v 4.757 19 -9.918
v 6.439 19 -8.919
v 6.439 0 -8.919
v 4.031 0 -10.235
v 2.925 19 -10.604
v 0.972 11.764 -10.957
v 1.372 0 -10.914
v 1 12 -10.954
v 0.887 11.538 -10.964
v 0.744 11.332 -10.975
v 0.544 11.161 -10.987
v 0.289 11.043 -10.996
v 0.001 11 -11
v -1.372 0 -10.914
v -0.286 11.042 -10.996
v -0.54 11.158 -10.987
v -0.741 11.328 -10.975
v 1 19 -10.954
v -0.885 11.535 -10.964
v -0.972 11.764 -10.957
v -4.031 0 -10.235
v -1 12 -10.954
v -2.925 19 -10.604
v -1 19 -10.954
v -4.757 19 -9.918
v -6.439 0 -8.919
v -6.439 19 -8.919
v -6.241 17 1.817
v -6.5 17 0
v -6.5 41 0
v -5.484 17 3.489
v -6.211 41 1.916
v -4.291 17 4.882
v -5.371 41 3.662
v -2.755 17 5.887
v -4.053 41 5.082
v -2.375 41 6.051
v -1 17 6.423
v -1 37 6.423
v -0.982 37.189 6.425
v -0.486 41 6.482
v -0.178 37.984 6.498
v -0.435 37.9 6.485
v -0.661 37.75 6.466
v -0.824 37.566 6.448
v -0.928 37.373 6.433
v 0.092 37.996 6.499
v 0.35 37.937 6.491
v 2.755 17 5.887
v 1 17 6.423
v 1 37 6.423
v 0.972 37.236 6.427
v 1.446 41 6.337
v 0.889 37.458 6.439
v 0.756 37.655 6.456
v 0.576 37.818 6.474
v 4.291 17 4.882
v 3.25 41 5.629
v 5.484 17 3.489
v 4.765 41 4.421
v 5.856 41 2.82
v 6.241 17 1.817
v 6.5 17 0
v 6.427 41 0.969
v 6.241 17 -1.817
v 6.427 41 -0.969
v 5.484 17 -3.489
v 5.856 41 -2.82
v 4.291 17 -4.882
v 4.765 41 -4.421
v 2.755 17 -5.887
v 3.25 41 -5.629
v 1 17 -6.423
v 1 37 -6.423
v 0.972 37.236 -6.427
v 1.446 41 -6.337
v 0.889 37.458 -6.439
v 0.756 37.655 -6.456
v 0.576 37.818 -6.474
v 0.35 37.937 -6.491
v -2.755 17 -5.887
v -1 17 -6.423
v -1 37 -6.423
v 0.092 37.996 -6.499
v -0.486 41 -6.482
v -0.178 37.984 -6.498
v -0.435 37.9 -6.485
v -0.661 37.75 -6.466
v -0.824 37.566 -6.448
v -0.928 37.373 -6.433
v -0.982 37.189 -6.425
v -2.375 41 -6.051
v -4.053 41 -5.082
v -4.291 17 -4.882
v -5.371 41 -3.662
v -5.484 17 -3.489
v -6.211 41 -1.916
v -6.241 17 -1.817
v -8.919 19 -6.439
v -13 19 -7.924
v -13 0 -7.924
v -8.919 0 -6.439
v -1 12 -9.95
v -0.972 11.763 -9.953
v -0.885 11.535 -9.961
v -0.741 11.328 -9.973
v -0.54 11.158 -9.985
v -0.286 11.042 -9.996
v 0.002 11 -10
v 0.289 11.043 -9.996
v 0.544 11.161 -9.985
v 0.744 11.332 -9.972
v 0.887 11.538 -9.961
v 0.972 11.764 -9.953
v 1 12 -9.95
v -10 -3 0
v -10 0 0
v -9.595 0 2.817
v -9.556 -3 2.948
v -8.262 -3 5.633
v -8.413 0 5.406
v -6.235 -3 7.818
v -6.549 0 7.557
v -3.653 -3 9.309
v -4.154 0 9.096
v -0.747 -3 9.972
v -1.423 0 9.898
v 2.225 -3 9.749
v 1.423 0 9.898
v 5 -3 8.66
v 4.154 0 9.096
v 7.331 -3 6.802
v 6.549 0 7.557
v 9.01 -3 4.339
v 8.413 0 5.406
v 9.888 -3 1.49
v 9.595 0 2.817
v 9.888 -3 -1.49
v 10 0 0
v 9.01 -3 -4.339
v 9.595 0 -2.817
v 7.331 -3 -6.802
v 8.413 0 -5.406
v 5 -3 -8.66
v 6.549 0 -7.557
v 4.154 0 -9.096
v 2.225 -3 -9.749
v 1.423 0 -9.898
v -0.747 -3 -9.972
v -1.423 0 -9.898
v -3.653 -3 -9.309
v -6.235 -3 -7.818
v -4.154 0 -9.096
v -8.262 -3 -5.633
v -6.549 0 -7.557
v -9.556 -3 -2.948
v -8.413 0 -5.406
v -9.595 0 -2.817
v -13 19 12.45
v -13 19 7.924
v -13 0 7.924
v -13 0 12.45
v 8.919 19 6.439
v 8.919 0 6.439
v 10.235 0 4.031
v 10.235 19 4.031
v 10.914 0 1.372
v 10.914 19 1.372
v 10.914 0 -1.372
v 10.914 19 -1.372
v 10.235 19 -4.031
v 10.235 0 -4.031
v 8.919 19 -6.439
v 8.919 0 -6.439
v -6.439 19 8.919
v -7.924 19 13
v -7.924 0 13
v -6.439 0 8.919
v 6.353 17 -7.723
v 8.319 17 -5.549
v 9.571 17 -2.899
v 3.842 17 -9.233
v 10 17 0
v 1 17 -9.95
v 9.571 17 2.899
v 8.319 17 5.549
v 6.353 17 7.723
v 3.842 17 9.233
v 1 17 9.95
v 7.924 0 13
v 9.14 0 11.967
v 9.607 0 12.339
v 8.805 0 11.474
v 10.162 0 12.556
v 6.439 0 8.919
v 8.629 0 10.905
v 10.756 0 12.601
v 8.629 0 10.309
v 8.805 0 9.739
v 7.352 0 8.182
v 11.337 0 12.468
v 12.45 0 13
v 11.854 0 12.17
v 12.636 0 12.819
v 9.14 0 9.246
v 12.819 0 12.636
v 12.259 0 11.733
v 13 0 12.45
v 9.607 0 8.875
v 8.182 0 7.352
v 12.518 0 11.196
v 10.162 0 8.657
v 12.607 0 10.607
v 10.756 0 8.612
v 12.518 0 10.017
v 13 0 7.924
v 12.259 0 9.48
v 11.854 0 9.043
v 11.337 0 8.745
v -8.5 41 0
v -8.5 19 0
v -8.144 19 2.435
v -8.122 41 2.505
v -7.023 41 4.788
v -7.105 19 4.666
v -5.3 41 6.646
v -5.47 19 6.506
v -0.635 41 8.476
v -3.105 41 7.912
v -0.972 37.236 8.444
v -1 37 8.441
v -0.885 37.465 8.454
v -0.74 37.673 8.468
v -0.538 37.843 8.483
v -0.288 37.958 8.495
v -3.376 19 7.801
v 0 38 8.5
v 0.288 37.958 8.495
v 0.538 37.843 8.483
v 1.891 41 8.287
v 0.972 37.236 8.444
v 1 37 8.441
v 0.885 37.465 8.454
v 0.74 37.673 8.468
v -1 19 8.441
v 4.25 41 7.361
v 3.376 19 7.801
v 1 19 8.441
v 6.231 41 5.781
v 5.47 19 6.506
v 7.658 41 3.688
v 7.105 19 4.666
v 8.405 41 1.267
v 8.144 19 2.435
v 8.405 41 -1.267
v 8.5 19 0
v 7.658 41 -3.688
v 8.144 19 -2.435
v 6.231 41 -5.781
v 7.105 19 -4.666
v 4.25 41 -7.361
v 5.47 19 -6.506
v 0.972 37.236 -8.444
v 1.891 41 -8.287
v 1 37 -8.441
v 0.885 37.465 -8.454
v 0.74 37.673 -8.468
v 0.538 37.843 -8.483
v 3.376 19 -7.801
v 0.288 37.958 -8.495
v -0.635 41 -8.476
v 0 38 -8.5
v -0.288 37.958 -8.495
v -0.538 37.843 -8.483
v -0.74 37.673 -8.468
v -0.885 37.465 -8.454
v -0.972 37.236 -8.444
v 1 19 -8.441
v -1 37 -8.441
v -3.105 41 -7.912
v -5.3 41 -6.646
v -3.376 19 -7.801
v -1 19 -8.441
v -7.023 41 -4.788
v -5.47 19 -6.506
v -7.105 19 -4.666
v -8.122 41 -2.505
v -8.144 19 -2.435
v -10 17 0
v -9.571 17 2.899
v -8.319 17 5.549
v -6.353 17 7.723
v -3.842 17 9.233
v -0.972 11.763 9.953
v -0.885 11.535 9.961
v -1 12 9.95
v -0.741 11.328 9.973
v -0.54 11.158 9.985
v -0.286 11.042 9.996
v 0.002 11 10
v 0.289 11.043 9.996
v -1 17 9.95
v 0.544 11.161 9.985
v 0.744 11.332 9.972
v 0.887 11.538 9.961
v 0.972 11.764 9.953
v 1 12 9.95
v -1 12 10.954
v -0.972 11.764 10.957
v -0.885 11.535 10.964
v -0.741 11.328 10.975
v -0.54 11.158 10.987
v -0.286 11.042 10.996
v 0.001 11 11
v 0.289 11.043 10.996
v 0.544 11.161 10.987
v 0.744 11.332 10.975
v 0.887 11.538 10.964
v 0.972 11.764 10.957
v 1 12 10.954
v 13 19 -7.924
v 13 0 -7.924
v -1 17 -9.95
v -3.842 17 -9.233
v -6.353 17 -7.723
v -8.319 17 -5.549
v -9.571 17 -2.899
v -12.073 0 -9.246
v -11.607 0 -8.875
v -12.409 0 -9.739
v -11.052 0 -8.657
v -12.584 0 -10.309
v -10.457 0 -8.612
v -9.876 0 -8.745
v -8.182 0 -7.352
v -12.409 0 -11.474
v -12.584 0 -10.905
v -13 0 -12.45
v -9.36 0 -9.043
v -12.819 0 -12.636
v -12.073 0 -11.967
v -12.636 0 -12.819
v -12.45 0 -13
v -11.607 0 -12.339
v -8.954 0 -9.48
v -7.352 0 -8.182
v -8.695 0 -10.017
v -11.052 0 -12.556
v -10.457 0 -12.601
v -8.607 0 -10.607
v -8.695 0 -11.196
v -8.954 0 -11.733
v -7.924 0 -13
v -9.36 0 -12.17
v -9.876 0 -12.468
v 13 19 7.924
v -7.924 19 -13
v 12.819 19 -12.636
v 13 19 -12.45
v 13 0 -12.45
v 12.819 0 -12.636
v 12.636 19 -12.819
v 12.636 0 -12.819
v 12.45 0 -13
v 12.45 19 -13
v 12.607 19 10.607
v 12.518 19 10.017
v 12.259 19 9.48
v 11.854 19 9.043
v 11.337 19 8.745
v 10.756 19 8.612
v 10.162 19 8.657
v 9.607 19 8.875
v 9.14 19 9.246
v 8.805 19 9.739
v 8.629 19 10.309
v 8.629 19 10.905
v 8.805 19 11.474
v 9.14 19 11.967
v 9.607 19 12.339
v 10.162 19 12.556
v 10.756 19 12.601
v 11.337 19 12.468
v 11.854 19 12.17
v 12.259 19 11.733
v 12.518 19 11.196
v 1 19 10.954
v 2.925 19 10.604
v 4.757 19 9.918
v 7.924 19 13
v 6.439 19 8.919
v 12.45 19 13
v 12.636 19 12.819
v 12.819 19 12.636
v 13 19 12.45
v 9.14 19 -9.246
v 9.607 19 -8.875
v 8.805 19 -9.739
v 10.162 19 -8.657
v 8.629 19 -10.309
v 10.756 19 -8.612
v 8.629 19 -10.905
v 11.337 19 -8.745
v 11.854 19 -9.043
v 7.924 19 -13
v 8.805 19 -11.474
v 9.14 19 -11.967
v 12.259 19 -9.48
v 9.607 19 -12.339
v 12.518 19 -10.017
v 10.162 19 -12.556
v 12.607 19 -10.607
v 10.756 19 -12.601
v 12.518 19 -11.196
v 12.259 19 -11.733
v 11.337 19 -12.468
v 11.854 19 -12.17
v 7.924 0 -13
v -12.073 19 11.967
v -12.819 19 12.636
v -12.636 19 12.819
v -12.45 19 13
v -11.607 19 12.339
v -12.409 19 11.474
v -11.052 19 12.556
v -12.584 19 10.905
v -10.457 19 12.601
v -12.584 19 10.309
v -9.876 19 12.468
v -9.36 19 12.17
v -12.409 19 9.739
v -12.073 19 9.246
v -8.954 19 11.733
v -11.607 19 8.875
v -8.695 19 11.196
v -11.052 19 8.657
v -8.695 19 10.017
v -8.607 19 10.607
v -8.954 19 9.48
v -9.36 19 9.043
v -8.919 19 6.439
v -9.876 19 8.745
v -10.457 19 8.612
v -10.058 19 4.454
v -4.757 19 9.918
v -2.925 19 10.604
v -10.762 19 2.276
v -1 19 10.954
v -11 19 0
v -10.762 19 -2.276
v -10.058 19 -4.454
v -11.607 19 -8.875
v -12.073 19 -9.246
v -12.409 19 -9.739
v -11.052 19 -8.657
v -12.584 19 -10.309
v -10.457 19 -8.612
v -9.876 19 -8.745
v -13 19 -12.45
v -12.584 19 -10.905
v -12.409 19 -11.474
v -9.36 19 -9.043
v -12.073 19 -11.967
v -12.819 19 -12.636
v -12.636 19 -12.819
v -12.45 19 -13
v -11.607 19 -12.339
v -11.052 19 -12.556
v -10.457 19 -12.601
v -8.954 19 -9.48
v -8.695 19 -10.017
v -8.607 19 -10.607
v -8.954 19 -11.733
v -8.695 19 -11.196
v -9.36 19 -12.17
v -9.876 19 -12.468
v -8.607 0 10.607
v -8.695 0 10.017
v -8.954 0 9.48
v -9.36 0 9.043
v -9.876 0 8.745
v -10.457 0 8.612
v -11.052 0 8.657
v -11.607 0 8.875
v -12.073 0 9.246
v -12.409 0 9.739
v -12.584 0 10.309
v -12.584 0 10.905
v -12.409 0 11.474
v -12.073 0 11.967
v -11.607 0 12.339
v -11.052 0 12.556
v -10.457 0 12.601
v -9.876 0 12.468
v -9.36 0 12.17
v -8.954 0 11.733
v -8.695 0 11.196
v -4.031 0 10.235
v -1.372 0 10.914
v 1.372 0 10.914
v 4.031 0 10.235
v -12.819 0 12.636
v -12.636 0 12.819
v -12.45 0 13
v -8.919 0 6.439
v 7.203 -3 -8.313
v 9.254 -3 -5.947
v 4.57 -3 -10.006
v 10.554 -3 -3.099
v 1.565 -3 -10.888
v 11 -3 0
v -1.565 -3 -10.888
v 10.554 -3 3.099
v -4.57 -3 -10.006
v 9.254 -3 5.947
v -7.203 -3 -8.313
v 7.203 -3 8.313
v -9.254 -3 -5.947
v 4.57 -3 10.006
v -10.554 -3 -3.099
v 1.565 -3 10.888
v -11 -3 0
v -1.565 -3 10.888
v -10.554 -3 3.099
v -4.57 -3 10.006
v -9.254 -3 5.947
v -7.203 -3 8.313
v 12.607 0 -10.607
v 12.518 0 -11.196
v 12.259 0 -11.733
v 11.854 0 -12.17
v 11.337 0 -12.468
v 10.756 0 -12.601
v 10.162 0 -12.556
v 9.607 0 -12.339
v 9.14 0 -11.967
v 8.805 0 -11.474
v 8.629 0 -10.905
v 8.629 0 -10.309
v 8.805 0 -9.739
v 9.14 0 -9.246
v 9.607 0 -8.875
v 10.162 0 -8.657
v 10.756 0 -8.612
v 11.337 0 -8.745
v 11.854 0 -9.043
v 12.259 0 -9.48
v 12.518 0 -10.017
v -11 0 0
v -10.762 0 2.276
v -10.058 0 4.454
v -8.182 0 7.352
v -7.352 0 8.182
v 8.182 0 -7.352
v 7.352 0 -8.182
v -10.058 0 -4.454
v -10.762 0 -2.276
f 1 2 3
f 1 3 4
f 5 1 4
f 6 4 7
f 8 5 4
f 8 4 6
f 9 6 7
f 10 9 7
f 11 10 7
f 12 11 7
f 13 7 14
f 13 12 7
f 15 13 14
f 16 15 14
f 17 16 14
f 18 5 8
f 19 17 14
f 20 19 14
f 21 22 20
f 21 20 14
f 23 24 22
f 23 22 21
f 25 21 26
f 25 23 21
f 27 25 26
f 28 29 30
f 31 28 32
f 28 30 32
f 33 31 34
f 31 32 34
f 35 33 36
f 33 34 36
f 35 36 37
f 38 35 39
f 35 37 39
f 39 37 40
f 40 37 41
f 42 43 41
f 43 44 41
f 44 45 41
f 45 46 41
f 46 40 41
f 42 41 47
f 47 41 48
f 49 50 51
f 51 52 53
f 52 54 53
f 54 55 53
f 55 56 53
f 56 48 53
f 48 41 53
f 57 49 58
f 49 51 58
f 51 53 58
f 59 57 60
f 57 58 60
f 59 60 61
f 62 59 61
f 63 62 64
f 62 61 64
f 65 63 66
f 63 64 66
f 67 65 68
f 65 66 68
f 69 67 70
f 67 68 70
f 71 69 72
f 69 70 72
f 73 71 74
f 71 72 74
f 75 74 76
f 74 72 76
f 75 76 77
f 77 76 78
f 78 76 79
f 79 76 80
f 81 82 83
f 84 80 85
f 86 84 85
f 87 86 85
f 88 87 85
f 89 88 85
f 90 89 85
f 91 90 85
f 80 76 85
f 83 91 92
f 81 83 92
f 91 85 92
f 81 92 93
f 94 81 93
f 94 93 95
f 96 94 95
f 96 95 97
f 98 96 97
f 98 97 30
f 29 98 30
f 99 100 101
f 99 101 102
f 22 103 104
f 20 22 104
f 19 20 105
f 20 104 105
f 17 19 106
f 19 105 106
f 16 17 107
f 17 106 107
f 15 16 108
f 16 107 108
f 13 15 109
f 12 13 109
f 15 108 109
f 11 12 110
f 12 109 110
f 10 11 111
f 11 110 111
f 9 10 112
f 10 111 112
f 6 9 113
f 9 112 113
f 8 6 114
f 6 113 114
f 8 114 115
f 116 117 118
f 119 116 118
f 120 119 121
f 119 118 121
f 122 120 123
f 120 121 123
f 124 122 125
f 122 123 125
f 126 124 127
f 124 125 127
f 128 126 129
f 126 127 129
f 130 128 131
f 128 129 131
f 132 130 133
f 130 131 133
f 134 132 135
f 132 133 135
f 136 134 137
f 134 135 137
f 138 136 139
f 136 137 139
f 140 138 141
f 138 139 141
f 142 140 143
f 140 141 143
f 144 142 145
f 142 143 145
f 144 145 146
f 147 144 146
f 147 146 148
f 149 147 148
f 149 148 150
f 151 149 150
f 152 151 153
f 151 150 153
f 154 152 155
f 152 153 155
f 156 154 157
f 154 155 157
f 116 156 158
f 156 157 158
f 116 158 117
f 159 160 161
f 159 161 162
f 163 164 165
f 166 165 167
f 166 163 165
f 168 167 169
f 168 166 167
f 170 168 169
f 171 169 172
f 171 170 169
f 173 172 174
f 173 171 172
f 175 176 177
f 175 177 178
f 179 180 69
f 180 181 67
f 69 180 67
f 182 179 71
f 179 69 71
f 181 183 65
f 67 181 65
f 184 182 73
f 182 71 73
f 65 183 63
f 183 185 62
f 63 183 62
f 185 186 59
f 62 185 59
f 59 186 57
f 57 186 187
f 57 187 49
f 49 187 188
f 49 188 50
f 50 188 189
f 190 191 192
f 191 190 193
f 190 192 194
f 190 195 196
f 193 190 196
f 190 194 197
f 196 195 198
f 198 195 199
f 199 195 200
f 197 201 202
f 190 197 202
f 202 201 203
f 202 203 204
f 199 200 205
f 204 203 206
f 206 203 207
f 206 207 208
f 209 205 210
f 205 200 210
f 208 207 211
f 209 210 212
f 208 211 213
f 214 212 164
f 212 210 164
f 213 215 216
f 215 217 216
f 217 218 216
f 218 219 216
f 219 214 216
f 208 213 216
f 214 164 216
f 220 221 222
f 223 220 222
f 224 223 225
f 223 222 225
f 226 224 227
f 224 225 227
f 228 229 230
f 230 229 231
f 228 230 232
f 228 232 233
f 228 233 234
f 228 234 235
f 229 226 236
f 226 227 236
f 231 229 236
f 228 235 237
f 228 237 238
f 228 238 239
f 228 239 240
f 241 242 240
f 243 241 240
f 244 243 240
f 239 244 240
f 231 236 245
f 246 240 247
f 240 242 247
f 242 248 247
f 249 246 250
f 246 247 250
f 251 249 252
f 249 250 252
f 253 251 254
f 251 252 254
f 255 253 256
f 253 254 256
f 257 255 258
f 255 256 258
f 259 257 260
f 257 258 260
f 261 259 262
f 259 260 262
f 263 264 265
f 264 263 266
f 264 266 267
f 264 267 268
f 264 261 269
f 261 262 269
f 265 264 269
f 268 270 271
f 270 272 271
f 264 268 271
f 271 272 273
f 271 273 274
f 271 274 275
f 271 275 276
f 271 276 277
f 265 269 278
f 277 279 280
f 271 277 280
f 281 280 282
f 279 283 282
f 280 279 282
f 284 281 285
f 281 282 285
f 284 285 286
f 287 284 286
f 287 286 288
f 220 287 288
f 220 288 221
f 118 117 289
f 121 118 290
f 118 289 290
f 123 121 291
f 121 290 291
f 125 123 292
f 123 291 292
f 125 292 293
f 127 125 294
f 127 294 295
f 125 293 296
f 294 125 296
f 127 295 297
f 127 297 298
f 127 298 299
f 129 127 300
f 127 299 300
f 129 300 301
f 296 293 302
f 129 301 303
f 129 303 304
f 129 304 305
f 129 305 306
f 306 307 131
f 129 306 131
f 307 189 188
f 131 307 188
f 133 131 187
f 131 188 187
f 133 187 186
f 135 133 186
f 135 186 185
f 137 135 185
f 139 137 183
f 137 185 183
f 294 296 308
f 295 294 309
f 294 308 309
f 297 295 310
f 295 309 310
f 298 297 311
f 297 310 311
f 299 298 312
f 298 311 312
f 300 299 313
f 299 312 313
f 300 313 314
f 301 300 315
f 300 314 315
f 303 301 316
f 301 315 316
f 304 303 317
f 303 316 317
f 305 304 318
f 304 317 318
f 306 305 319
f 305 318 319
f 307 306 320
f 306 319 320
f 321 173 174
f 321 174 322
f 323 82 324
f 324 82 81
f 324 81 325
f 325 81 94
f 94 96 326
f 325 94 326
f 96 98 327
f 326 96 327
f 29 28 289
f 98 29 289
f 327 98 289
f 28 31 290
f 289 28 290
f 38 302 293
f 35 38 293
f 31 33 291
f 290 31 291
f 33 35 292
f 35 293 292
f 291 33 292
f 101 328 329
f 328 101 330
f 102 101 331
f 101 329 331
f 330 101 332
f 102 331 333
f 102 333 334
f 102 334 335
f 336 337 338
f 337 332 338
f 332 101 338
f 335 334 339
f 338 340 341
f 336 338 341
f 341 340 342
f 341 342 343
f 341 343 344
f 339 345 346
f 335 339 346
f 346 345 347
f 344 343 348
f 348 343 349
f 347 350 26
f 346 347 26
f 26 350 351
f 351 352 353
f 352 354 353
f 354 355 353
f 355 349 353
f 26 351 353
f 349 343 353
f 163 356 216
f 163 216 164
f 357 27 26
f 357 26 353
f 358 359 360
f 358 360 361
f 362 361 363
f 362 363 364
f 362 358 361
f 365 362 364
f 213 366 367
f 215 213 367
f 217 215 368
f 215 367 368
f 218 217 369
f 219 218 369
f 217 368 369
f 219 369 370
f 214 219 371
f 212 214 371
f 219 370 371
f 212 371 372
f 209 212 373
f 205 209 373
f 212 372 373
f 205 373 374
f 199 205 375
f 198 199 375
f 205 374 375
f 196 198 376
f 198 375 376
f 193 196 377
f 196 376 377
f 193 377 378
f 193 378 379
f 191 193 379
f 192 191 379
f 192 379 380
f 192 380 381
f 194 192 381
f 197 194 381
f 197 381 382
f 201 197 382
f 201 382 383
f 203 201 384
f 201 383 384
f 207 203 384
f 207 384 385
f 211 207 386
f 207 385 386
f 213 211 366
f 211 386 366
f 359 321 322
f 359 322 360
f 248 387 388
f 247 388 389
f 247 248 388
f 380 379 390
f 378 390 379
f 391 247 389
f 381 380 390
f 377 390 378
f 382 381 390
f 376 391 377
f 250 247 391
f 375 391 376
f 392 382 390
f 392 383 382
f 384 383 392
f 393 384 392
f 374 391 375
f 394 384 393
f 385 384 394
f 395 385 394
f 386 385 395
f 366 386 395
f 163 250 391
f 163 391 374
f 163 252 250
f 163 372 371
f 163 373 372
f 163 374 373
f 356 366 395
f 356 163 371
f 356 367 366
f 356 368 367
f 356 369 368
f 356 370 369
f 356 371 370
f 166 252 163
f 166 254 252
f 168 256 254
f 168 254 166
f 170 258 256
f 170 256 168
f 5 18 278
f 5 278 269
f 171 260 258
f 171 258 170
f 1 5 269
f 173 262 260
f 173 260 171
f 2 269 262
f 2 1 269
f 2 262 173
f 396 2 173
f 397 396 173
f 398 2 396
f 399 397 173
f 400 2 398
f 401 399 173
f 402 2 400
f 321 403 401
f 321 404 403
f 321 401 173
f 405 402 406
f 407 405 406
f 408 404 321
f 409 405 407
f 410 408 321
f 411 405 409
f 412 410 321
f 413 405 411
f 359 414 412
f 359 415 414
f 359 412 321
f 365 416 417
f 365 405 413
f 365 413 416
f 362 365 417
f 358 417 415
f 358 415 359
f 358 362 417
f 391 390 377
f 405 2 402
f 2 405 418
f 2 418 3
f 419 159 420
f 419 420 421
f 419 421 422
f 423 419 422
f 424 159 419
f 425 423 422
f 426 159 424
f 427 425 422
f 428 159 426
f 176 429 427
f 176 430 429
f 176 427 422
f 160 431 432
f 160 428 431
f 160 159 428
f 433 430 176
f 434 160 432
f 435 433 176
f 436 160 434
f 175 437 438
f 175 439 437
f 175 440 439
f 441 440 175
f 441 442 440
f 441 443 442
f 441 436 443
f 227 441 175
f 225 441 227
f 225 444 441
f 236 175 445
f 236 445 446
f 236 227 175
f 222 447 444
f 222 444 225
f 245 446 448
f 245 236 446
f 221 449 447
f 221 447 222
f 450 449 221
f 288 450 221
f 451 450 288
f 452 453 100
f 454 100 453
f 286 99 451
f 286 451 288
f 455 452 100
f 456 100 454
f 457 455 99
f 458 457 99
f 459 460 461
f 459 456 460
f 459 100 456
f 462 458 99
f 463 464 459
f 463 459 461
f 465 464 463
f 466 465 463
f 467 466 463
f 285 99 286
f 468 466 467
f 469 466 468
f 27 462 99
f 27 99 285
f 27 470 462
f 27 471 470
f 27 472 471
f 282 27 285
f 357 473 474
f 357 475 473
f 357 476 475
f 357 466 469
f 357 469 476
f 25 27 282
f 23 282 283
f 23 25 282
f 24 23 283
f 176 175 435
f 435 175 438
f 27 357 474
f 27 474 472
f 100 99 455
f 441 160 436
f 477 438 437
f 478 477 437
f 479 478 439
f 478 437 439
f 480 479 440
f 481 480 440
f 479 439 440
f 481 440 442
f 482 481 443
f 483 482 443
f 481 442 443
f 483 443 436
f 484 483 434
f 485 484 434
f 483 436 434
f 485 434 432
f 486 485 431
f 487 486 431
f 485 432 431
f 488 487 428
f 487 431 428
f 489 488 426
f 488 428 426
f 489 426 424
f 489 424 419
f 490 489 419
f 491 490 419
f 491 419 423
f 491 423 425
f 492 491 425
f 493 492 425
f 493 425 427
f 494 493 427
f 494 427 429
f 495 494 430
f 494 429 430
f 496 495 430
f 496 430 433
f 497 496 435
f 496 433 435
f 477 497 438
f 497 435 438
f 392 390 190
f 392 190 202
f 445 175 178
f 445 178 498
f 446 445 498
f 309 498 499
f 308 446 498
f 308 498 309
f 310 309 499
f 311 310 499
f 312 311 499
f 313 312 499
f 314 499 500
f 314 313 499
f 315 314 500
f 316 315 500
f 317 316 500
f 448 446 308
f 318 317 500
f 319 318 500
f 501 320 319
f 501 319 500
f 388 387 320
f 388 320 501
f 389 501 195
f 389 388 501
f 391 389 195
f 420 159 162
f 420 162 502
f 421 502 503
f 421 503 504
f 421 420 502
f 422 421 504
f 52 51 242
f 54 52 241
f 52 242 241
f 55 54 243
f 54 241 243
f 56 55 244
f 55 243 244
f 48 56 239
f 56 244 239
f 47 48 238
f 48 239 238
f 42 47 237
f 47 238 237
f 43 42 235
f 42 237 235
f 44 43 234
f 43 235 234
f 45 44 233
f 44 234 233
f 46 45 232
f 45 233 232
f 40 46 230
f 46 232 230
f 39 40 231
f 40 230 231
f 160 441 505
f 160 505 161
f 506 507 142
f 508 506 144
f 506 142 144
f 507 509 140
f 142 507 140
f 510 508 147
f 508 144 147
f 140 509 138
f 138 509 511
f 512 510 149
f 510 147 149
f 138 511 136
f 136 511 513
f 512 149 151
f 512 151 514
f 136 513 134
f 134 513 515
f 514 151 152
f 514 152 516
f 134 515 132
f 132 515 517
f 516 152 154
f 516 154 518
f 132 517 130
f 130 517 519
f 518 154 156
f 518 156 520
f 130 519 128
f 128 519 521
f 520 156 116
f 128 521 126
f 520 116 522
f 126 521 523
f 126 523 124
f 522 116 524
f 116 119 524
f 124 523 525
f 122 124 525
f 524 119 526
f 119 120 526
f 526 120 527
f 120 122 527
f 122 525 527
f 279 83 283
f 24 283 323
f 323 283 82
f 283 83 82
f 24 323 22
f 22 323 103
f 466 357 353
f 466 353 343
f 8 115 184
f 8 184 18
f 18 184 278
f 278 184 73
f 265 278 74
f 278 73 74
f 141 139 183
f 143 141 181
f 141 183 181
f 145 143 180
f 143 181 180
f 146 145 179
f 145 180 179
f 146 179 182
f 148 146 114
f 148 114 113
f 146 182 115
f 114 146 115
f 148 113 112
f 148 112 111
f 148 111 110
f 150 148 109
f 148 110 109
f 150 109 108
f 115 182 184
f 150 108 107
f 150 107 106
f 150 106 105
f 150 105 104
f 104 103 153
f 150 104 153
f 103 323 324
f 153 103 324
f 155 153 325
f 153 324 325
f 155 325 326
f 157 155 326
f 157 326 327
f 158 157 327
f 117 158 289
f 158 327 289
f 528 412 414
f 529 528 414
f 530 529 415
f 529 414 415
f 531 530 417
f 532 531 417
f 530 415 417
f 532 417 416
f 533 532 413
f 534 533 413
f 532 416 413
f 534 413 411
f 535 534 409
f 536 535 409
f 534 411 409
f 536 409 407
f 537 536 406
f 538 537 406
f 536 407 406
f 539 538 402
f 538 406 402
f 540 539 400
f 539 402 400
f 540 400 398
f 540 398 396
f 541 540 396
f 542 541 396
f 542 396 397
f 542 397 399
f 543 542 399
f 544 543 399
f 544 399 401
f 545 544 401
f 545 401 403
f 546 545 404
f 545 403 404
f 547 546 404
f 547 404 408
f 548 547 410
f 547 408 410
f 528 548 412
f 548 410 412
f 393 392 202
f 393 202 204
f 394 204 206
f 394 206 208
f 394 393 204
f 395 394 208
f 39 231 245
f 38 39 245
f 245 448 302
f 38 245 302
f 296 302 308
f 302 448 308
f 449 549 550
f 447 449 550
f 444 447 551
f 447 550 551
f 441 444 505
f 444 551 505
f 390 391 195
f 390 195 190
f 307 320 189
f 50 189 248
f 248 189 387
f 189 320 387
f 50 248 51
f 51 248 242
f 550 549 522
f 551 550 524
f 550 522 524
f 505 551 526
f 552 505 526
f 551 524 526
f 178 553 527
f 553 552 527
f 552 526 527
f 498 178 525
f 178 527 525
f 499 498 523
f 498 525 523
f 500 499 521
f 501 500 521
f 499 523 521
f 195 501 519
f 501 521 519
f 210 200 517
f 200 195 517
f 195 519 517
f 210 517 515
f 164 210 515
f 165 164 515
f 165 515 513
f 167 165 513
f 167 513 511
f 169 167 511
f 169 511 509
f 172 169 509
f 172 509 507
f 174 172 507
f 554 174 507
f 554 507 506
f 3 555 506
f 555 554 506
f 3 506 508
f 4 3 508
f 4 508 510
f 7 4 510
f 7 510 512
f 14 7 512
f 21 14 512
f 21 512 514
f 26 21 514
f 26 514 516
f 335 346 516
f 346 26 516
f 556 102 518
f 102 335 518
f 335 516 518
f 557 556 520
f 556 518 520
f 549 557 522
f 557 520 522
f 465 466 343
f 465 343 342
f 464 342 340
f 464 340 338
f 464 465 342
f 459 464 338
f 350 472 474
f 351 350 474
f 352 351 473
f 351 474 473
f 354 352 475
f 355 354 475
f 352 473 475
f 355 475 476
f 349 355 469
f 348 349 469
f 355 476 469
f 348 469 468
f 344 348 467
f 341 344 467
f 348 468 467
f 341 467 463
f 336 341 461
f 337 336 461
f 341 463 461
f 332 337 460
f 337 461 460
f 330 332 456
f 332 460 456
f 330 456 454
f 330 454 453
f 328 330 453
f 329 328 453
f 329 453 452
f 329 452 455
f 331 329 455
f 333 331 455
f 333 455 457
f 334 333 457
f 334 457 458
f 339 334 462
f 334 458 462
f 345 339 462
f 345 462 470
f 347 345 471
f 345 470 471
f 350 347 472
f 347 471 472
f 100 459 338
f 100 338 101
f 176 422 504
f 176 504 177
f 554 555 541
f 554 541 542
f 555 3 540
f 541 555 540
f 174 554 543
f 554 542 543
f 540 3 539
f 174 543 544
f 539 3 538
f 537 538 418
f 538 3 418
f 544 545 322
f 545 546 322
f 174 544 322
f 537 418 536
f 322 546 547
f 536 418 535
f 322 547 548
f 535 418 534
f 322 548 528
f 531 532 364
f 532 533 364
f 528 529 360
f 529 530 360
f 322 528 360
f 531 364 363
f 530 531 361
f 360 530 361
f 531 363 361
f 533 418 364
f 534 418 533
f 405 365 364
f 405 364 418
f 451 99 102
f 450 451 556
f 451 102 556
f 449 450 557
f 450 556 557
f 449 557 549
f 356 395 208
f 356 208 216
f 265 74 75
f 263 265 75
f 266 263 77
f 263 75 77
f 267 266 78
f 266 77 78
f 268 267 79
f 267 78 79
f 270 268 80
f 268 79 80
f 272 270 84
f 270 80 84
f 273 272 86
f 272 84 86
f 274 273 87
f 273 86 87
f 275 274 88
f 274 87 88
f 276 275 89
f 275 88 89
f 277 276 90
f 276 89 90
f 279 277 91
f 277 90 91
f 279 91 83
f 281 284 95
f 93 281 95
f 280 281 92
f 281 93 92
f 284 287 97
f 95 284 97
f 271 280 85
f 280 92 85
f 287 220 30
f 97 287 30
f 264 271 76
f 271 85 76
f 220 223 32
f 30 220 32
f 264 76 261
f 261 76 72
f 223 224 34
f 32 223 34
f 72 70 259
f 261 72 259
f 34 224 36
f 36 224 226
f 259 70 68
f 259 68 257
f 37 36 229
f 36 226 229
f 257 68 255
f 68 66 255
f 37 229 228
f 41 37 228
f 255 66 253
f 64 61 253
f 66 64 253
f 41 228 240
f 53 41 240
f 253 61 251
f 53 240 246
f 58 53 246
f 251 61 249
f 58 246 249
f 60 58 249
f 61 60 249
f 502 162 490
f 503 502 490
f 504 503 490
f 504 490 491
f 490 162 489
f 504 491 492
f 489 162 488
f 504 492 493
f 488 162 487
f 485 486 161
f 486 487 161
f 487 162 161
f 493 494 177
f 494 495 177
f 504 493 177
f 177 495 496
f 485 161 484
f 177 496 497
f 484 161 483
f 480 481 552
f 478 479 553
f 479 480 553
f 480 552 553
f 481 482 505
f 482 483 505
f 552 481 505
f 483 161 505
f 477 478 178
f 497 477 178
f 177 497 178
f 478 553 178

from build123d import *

# Parameters (mm, degrees)
ESQUISSE3_R      = 2
ESQUISSE3_R_2    = 10
EXTRUSION2_DEPTH = 19
EXTRUSION4_DEPTH = 27


with BuildPart() as part:
    # Esquisse1 → Révolution1 (revolve)
    with BuildSketch(Plane.XY):
        Polygon((-6.5, 17), (-6.5, 41), (-8.5, 41), (-8.5, 19), (-11, 19), (-11, -3), (-10, -3), (-10, 17), align=None)
    revolve(axis=Axis((0, 0, 0), (0, 1, 0)))

    # Esquisse3 → Extrusion2 (add)
    with BuildSketch(Plane(origin=(0, 19, 0), x_dir=(1, 0, 0), z_dir=(0, 1, 0))):
        with BuildLine():
            Line((-12.449899598, -13), (-7.924146363, -13))
            Line((-7.924146363, -13), (-6.438678833, -8.918711504))
            ThreePointArc((-6.438678833, -8.918711504), (0, -11), (6.438678833, -8.918711504))
            Line((6.438678833, -8.918711504), (7.924146363, -13))
            Line((7.924146363, -13), (12.449899598, -13))
            ThreePointArc((12.449899598, -13), (12.727922061, -12.727922061), (13, -12.449899598))
            Line((13, -12.449899598), (13, -7.924146363))
            Line((13, -7.924146363), (8.918711504, -6.438678833))
            ThreePointArc((8.918711504, -6.438678833), (11, 0), (8.918711504, 6.438678833))
            Line((8.918711504, 6.438678833), (13, 7.924146363))
            Line((13, 7.924146363), (13, 12.449899598))
            ThreePointArc((13, 12.449899598), (12.727922061, 12.727922061), (12.449899598, 13))
            Line((12.449899598, 13), (7.924146363, 13))
            Line((7.924146363, 13), (6.438678833, 8.918711504))
            ThreePointArc((6.438678833, 8.918711504), (0, 11), (-6.438678833, 8.918711504))
            Line((-6.438678833, 8.918711504), (-7.924146363, 13))
            Line((-7.924146363, 13), (-12.449899598, 13))
            ThreePointArc((-12.449899598, 13), (-12.727922061, 12.727922061), (-13, 12.449899598))
            Line((-13, 12.449899598), (-13, 7.924146363))
            Line((-13, 7.924146363), (-8.918711504, 6.438678833))
            ThreePointArc((-8.918711504, 6.438678833), (-11, 0), (-8.918711504, -6.438678833))
            Line((-8.918711504, -6.438678833), (-13, -7.924146363))
            Line((-13, -7.924146363), (-13, -12.449899598))
            ThreePointArc((-13, -12.449899598), (-12.727922061, -12.727922061), (-12.449899598, -13))
        make_face()
        with Locations((10.606601718, 10.606601718)):
            Circle(ESQUISSE3_R, mode=Mode.SUBTRACT)
        with Locations((-10.606601718, -10.606601718)):
            Circle(ESQUISSE3_R, mode=Mode.SUBTRACT)
        with Locations((-10.606601718, 10.606601718)):
            Circle(ESQUISSE3_R, mode=Mode.SUBTRACT)
        with Locations((10.606601718, -10.606601718)):
            Circle(ESQUISSE3_R, mode=Mode.SUBTRACT)
        Circle(ESQUISSE3_R_2, mode=Mode.SUBTRACT)
    extrude(amount=-EXTRUSION2_DEPTH)

    # Esquisse4 → Extrusion4 (cut, through all)
    with BuildSketch(Plane.XY.offset(13)):
        with BuildLine():
            Line((-1, 37), (-1, 12))
            ThreePointArc((-1, 12), (0, 11), (1, 12))
            Line((1, 12), (1, 37))
            ThreePointArc((1, 37), (0, 38), (-1, 37))
        make_face()
    extrude(amount=-EXTRUSION4_DEPTH, mode=Mode.SUBTRACT)


solid = part.part
